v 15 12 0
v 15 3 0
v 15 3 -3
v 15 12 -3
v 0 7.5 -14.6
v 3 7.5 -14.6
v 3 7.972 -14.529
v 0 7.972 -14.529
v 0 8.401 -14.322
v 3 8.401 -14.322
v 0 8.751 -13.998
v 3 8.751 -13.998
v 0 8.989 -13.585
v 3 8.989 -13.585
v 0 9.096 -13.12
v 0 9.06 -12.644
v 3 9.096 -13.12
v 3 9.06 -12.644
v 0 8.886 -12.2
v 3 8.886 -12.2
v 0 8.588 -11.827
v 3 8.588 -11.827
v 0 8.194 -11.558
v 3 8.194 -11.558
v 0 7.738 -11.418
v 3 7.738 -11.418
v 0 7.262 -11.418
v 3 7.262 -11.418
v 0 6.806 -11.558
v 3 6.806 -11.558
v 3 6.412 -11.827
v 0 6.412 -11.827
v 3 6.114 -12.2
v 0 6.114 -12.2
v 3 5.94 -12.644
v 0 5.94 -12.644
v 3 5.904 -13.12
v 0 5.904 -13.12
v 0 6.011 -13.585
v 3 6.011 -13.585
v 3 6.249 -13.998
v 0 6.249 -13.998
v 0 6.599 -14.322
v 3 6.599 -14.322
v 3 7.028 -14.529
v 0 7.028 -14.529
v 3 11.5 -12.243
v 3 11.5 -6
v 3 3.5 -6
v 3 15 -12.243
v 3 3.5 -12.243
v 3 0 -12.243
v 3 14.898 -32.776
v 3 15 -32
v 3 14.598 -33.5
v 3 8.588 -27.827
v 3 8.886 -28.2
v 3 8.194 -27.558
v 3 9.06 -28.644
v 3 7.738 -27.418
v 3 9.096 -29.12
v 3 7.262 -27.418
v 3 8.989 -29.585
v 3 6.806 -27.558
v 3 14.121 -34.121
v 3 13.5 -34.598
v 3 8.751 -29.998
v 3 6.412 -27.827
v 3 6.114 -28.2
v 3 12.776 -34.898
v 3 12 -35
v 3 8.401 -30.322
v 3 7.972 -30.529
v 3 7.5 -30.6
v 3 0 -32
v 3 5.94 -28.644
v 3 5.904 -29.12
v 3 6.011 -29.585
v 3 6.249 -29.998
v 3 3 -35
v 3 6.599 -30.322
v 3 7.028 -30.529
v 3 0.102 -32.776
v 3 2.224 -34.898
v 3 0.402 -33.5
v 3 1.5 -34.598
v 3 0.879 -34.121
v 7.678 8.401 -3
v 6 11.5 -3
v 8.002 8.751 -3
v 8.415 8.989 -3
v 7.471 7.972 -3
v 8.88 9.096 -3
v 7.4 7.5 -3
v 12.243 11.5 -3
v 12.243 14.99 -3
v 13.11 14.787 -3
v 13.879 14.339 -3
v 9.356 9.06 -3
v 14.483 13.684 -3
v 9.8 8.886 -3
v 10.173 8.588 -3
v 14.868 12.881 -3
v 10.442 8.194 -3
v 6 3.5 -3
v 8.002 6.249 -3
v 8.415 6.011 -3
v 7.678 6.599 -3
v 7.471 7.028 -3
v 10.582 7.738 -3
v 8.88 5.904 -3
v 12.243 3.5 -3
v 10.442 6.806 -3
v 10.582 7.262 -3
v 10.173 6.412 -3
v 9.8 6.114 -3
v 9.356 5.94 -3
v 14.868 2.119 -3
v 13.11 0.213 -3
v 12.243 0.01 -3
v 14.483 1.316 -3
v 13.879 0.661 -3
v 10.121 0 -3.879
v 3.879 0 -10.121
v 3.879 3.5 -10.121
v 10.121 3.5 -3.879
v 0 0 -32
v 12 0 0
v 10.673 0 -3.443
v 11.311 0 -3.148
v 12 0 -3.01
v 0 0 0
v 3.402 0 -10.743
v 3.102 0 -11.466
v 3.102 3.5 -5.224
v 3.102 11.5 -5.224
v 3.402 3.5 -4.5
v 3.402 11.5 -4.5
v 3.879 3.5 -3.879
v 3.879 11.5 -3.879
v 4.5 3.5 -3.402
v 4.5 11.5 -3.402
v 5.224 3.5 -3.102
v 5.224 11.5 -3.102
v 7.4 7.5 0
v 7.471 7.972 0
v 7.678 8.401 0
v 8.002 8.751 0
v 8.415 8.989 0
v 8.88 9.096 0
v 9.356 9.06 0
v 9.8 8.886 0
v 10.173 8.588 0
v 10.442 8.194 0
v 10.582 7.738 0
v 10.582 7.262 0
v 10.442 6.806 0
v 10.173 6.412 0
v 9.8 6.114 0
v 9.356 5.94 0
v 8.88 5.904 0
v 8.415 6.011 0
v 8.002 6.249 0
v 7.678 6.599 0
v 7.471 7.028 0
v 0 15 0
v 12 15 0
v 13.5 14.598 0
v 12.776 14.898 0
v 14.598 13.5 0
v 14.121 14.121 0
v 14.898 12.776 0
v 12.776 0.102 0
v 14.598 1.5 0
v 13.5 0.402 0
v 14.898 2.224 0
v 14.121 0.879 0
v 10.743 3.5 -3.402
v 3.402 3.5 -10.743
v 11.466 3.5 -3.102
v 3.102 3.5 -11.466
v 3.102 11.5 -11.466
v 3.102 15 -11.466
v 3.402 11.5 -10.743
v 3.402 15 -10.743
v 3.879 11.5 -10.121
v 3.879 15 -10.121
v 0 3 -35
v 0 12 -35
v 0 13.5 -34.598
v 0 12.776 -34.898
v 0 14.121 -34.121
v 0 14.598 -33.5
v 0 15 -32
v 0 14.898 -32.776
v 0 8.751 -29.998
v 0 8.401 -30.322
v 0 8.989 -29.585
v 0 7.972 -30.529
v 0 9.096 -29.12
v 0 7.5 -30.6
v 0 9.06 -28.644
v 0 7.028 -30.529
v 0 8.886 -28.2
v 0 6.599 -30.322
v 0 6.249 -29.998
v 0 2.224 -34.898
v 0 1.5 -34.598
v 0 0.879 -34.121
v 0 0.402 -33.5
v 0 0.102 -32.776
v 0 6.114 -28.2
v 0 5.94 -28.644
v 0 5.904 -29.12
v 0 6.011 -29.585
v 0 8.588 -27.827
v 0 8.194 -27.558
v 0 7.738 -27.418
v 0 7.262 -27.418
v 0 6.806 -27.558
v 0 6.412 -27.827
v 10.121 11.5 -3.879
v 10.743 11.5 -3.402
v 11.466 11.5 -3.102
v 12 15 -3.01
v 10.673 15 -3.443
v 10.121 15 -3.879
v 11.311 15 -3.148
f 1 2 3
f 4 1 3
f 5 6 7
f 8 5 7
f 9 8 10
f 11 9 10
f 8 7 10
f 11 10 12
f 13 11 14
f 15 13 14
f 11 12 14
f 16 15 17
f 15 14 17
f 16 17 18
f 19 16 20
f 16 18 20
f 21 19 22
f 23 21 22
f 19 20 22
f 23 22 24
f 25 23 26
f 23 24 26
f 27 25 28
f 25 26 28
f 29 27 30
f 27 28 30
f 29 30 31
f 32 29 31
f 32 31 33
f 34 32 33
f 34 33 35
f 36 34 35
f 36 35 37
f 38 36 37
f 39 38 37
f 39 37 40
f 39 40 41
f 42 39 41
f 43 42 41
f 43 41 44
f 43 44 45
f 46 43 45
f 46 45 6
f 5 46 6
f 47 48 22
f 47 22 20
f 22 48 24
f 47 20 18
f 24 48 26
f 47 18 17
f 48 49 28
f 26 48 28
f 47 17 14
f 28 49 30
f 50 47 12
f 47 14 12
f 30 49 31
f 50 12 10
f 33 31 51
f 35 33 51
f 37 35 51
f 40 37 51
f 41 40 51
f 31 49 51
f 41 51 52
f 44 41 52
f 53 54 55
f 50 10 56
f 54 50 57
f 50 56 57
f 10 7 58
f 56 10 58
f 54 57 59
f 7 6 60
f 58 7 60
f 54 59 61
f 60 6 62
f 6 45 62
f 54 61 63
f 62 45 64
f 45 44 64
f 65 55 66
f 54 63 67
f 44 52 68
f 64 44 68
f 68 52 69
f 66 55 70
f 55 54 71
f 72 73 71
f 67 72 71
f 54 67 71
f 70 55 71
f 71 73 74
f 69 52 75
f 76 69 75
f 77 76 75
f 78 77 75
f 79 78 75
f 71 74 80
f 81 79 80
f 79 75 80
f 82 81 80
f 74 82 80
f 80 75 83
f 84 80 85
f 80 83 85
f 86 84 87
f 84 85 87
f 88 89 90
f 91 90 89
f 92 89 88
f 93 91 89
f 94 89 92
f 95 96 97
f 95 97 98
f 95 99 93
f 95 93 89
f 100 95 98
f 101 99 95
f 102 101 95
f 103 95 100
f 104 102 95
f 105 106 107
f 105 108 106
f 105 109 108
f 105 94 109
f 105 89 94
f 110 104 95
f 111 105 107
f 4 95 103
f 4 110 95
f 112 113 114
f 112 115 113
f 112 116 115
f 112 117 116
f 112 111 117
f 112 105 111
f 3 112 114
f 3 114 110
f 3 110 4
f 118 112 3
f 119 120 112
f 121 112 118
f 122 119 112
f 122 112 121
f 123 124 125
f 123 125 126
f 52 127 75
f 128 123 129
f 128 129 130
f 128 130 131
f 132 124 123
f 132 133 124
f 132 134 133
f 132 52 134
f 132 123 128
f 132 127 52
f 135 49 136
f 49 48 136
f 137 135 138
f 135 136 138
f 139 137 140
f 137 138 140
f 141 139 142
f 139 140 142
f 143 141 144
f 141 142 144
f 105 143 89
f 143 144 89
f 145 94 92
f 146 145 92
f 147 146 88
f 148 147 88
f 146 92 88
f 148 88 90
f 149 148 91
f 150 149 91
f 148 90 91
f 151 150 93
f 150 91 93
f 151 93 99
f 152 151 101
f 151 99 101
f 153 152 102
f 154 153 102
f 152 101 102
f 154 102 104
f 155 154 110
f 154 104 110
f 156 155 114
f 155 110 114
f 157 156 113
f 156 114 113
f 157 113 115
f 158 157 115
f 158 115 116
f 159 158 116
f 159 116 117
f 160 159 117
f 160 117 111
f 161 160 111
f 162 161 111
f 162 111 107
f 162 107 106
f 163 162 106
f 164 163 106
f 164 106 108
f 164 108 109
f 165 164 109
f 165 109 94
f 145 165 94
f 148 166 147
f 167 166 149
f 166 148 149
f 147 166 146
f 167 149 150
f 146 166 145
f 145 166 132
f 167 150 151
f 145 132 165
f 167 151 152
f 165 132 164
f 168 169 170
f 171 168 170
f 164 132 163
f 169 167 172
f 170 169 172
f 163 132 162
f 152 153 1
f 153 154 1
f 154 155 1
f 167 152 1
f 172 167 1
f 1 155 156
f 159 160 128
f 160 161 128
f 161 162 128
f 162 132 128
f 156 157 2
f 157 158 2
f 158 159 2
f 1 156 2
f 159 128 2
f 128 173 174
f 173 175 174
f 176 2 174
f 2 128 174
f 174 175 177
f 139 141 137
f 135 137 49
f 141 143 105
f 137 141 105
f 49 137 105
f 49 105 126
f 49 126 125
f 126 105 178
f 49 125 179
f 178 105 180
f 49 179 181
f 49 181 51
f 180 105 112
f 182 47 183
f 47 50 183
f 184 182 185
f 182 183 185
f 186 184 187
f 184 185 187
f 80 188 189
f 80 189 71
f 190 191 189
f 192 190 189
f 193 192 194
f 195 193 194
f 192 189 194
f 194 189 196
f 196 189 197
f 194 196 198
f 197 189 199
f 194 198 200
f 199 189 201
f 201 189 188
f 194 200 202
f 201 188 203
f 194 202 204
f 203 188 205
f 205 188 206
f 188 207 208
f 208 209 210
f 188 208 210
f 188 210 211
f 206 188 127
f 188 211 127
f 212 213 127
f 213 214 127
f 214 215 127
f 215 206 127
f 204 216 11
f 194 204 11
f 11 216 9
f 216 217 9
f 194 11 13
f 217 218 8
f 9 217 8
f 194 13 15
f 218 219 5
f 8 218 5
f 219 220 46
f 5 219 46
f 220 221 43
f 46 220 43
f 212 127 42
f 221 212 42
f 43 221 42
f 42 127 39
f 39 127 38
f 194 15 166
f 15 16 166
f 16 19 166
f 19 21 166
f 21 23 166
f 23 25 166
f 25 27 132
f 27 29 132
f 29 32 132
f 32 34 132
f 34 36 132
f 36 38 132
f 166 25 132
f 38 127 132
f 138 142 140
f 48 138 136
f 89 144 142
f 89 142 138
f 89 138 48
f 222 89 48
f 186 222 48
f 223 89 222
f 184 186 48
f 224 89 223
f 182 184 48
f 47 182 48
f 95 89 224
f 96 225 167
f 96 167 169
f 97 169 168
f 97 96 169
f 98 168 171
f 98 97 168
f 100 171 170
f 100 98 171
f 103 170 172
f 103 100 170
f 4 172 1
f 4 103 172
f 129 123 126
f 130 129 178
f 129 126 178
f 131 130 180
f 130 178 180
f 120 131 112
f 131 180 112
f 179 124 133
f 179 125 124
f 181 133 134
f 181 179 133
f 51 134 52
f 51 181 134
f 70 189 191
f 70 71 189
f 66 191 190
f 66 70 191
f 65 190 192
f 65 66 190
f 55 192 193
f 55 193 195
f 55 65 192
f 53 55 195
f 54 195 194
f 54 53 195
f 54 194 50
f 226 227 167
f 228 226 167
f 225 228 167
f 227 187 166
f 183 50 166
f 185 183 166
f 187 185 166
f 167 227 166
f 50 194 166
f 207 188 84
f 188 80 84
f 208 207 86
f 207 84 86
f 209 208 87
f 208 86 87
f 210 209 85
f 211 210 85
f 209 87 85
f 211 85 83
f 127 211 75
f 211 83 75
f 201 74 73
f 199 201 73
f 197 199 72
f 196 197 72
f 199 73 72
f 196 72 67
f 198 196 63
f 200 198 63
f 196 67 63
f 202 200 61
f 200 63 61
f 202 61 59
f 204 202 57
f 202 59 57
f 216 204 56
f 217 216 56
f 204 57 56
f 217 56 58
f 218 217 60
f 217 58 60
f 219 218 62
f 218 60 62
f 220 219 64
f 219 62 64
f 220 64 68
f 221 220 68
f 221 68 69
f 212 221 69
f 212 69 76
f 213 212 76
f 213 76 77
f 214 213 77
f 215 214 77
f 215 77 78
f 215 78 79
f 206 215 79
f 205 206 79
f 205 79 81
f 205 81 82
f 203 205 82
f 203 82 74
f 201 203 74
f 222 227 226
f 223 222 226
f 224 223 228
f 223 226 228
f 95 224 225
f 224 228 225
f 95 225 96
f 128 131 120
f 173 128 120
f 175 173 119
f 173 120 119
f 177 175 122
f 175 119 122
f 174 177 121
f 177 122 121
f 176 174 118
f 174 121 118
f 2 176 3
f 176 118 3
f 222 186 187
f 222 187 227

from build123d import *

# Parameters (mm, degrees)
SKETCH1_W           = 3
SKETCH1_H           = 32
SKETCH1_H_2         = 3
SKETCH1_W_2         = 12
BOSS_EXTRUDE1_DEPTH = 15
SKETCH2_R           = 1.6
CUT_EXTRUDE1_DEPTH  = 39.392707641
SKETCH3_R           = 1.6
CUT_EXTRUDE2_DEPTH  = 40.924929555
FILLET1_R           = 3
CHAMFER1_SIZE       = 8
SKETCH6_W           = 8
SKETCH6_H           = 8
CUT_EXTRUDE5_DEPTH  = 12
FILLET2_R           = 3


with BuildPart() as part:
    # Sketch1 → Boss-Extrude1 (new body)
    with BuildSketch(Plane(origin=(0, 0, 0), x_dir=(1, 0, 0), z_dir=(0, 1, 0))):
        with Locations((1.5, 19)):
            Rectangle(SKETCH1_W, SKETCH1_H)
        with Locations((1.5, 1.5)):
            Rectangle(SKETCH1_W, SKETCH1_H_2)
        with Locations((9, 1.5)):
            Rectangle(SKETCH1_W_2, SKETCH1_H_2)
    extrude(amount=BOSS_EXTRUDE1_DEPTH)

    # Sketch2 → Cut-Extrude1 (cut, through all)
    with BuildSketch(Plane(origin=(0, 0, -3), x_dir=(-1, 0, 0), z_dir=(0, 0, -1))):
        with Locations((-9, 7.5)):
            Circle(SKETCH2_R)
    extrude(amount=-CUT_EXTRUDE1_DEPTH, mode=Mode.SUBTRACT)

    # Sketch3 → Cut-Extrude2 (cut, through all)
    with BuildSketch(Plane(origin=(3, 0, 0), x_dir=(0, 0, -1), z_dir=(1, 0, 0))):
        with Locations((13, 7.5)):
            Circle(SKETCH3_R)
        with Locations((29, 7.5)):
            Circle(SKETCH3_R)
    extrude(amount=-CUT_EXTRUDE2_DEPTH, mode=Mode.SUBTRACT)

    # Fillet1
    fillet1_edges = [part.edges().sort_by_distance(p)[0] for p in [
        (15, 15, -1.5),
        (1.5, 15, -35),
        (1.5, 0, -35),
        (15, 0, -1.5),
    ]]
    fillet(fillet1_edges, radius=FILLET1_R)

    # Chamfer1
    # the kernel refuses this chamfer: 8 mm, written as the material it adds along each edge
    with BuildSketch(Plane(origin=(3, 0, -3), x_dir=(-0.027495876610586382, 0, -0.9996219169112968), z_dir=(0, 1, 0))) as chamfer1_piece_1_section:
        Polygon((CHAMFER1_SIZE * 0.999621916911, -CHAMFER1_SIZE * 0.0274958766106), (-CHAMFER1_SIZE * 0.0274958766106, -CHAMFER1_SIZE * 0.999621916911), (0, 0), align=None)
    chamfer1_piece_1 = extrude(amount=15, mode=Mode.PRIVATE)
    chamfer1_piece_1 = chamfer1_piece_1 - Plane(origin=(9, 7.5, -5.695402836), x_dir=(-1, 0, 0), z_dir=(0, 0, -1)) * Cylinder(1.6, 62, mode=Mode.PRIVATE)
    add(chamfer1_piece_1)

    # Sketch6 → Cut-Extrude5 (cut)
    with BuildSketch(Plane(origin=(15, 0, 0), x_dir=(0, 0, -1), z_dir=(1, 0, 0))):
        with Locations((7, 7.5)):
            Rectangle(SKETCH6_W, SKETCH6_H)
    extrude(amount=-CUT_EXTRUDE5_DEPTH, mode=Mode.SUBTRACT)

    # Fillet2
    fillet2_edges = [part.edges().sort_by_distance(p)[0] for p in [
        (3, 7.5, -3),
        (11, 1.75, -3),
        (3, 1.75, -11),
        (3, 13.25, -11),
        (11, 13.25, -3),
    ]]
    fillet(fillet2_edges, radius=FILLET2_R)


solid = part.part
